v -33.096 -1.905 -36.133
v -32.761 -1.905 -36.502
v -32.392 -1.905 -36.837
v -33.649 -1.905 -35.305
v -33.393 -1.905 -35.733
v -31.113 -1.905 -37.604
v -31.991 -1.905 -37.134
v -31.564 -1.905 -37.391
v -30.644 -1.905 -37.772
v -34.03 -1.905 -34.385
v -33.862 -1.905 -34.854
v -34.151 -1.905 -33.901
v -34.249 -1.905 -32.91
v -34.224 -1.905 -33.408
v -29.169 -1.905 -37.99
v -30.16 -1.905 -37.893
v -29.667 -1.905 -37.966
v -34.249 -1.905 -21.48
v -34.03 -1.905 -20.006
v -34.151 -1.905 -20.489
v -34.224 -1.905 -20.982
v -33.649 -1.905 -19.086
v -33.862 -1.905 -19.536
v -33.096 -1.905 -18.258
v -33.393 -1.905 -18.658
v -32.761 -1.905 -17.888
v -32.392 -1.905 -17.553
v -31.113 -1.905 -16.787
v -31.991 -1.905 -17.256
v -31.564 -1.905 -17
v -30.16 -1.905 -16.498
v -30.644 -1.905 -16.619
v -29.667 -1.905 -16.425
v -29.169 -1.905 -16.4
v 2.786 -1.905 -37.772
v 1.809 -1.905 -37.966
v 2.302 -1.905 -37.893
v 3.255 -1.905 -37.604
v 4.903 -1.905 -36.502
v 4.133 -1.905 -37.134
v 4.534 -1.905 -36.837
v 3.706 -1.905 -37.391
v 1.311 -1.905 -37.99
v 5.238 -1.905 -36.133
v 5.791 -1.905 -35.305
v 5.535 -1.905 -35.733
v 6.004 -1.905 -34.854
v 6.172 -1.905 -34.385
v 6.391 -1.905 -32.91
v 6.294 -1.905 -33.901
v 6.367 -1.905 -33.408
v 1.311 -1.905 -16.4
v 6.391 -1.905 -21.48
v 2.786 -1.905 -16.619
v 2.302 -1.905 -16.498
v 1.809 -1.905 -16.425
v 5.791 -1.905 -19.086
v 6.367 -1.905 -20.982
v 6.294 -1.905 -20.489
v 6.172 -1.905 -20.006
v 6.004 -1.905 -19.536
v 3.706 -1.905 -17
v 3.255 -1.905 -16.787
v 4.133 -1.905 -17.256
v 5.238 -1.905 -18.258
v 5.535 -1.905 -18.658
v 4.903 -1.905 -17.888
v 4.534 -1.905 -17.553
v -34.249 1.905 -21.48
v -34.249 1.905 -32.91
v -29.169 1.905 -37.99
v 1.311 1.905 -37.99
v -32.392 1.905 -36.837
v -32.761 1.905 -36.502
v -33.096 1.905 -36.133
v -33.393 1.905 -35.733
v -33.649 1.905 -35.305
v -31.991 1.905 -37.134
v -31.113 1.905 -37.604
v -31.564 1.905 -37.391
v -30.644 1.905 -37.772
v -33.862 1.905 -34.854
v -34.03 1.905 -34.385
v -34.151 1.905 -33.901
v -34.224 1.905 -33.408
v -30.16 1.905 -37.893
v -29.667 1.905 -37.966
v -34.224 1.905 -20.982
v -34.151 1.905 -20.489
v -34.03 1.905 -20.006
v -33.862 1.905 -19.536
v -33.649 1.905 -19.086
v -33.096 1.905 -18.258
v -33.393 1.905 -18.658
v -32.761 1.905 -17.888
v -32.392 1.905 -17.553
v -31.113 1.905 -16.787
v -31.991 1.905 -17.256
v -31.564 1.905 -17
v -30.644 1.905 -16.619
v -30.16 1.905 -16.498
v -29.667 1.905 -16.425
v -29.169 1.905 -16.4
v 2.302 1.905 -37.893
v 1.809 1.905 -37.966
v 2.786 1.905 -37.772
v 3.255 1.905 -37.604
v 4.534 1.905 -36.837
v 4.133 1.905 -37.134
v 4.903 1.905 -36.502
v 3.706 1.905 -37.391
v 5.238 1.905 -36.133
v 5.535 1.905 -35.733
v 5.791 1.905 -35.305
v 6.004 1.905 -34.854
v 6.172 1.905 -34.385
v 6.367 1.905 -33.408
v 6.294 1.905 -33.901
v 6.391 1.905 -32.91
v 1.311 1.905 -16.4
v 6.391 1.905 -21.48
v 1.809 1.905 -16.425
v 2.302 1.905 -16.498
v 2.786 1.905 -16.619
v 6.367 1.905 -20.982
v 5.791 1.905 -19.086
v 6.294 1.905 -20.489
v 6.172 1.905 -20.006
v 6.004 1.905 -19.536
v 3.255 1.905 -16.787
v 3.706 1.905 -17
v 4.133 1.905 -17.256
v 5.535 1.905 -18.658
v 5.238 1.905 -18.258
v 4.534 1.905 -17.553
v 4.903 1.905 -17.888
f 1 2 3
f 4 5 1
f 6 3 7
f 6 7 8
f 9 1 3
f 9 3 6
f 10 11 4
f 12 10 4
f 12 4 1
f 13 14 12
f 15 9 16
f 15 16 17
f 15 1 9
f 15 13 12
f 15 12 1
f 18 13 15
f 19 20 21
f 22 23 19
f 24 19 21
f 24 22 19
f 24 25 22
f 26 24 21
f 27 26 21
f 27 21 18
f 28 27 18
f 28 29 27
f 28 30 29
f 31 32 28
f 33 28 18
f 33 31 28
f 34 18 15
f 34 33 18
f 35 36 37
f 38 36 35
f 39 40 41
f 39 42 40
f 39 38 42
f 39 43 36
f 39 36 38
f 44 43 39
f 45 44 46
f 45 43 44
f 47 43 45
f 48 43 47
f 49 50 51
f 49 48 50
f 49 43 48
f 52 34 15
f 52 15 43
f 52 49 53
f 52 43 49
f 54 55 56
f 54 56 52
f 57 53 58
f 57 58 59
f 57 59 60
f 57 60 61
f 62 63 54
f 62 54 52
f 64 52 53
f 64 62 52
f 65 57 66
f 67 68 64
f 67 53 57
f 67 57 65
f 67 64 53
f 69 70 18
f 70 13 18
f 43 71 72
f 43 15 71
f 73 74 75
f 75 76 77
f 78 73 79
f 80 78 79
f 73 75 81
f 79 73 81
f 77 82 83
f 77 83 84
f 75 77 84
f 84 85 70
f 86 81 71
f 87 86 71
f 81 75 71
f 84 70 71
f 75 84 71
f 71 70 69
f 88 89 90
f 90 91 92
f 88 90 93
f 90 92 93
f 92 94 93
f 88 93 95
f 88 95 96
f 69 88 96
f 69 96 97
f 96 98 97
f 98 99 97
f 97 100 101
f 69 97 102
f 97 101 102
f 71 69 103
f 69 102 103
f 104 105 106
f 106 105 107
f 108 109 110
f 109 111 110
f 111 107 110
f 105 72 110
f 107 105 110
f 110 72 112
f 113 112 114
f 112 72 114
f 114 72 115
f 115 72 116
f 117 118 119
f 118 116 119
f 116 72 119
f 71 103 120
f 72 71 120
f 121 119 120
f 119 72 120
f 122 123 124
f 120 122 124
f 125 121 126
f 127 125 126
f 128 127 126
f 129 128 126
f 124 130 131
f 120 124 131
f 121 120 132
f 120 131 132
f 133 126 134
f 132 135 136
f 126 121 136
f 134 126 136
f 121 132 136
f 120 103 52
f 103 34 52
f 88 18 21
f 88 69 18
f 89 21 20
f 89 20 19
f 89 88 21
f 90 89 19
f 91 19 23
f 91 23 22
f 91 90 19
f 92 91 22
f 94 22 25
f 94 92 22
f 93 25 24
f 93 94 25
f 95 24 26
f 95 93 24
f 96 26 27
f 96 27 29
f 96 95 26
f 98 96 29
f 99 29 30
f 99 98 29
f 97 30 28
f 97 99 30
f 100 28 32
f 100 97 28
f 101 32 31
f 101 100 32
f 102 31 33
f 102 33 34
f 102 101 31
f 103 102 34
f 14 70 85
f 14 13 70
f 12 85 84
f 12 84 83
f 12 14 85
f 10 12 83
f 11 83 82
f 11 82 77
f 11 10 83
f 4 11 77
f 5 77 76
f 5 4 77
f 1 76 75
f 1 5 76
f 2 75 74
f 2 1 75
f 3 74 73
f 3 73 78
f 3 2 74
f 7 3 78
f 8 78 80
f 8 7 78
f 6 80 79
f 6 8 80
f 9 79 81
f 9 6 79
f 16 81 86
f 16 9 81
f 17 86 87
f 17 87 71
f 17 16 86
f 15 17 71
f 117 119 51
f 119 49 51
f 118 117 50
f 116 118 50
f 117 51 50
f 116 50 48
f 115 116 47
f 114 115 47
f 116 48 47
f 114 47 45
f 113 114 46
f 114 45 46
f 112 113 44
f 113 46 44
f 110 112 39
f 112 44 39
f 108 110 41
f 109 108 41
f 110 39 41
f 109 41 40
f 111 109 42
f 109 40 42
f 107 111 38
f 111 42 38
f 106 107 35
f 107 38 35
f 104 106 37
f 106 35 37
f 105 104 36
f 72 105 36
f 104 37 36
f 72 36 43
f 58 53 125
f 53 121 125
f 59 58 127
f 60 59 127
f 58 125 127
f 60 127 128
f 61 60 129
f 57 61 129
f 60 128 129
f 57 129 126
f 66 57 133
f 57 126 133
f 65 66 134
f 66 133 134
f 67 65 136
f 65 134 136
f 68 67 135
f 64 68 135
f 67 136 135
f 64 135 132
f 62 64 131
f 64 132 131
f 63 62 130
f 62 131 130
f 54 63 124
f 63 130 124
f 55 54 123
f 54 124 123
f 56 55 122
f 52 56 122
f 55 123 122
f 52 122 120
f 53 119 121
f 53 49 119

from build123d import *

# Parameters (mm, degrees)
F0_W     = 40.64
F0_H     = 21.59
F1_DEPTH = 1.905
F2_R     = 5.08


with BuildPart() as f1:
    # F0 (on Front) → F1 (new body, symmetric)
    with BuildSketch(Plane.XZ):
        with Locations((-13.928885, -27.195361)):
            Rectangle(F0_W, F0_H)
    extrude(amount=F1_DEPTH, both=True)

    # F2
    f2_edges = [f1.edges().sort_by_distance(p)[0] for p in [
        (-34.248885, 0, -16.400361),
        (6.391115, 0, -16.400361),
        (-34.248885, 0, -37.990361),
        (6.391115, 0, -37.990361),
    ]]
    fillet(f2_edges, radius=F2_R)


solid = f1.part
